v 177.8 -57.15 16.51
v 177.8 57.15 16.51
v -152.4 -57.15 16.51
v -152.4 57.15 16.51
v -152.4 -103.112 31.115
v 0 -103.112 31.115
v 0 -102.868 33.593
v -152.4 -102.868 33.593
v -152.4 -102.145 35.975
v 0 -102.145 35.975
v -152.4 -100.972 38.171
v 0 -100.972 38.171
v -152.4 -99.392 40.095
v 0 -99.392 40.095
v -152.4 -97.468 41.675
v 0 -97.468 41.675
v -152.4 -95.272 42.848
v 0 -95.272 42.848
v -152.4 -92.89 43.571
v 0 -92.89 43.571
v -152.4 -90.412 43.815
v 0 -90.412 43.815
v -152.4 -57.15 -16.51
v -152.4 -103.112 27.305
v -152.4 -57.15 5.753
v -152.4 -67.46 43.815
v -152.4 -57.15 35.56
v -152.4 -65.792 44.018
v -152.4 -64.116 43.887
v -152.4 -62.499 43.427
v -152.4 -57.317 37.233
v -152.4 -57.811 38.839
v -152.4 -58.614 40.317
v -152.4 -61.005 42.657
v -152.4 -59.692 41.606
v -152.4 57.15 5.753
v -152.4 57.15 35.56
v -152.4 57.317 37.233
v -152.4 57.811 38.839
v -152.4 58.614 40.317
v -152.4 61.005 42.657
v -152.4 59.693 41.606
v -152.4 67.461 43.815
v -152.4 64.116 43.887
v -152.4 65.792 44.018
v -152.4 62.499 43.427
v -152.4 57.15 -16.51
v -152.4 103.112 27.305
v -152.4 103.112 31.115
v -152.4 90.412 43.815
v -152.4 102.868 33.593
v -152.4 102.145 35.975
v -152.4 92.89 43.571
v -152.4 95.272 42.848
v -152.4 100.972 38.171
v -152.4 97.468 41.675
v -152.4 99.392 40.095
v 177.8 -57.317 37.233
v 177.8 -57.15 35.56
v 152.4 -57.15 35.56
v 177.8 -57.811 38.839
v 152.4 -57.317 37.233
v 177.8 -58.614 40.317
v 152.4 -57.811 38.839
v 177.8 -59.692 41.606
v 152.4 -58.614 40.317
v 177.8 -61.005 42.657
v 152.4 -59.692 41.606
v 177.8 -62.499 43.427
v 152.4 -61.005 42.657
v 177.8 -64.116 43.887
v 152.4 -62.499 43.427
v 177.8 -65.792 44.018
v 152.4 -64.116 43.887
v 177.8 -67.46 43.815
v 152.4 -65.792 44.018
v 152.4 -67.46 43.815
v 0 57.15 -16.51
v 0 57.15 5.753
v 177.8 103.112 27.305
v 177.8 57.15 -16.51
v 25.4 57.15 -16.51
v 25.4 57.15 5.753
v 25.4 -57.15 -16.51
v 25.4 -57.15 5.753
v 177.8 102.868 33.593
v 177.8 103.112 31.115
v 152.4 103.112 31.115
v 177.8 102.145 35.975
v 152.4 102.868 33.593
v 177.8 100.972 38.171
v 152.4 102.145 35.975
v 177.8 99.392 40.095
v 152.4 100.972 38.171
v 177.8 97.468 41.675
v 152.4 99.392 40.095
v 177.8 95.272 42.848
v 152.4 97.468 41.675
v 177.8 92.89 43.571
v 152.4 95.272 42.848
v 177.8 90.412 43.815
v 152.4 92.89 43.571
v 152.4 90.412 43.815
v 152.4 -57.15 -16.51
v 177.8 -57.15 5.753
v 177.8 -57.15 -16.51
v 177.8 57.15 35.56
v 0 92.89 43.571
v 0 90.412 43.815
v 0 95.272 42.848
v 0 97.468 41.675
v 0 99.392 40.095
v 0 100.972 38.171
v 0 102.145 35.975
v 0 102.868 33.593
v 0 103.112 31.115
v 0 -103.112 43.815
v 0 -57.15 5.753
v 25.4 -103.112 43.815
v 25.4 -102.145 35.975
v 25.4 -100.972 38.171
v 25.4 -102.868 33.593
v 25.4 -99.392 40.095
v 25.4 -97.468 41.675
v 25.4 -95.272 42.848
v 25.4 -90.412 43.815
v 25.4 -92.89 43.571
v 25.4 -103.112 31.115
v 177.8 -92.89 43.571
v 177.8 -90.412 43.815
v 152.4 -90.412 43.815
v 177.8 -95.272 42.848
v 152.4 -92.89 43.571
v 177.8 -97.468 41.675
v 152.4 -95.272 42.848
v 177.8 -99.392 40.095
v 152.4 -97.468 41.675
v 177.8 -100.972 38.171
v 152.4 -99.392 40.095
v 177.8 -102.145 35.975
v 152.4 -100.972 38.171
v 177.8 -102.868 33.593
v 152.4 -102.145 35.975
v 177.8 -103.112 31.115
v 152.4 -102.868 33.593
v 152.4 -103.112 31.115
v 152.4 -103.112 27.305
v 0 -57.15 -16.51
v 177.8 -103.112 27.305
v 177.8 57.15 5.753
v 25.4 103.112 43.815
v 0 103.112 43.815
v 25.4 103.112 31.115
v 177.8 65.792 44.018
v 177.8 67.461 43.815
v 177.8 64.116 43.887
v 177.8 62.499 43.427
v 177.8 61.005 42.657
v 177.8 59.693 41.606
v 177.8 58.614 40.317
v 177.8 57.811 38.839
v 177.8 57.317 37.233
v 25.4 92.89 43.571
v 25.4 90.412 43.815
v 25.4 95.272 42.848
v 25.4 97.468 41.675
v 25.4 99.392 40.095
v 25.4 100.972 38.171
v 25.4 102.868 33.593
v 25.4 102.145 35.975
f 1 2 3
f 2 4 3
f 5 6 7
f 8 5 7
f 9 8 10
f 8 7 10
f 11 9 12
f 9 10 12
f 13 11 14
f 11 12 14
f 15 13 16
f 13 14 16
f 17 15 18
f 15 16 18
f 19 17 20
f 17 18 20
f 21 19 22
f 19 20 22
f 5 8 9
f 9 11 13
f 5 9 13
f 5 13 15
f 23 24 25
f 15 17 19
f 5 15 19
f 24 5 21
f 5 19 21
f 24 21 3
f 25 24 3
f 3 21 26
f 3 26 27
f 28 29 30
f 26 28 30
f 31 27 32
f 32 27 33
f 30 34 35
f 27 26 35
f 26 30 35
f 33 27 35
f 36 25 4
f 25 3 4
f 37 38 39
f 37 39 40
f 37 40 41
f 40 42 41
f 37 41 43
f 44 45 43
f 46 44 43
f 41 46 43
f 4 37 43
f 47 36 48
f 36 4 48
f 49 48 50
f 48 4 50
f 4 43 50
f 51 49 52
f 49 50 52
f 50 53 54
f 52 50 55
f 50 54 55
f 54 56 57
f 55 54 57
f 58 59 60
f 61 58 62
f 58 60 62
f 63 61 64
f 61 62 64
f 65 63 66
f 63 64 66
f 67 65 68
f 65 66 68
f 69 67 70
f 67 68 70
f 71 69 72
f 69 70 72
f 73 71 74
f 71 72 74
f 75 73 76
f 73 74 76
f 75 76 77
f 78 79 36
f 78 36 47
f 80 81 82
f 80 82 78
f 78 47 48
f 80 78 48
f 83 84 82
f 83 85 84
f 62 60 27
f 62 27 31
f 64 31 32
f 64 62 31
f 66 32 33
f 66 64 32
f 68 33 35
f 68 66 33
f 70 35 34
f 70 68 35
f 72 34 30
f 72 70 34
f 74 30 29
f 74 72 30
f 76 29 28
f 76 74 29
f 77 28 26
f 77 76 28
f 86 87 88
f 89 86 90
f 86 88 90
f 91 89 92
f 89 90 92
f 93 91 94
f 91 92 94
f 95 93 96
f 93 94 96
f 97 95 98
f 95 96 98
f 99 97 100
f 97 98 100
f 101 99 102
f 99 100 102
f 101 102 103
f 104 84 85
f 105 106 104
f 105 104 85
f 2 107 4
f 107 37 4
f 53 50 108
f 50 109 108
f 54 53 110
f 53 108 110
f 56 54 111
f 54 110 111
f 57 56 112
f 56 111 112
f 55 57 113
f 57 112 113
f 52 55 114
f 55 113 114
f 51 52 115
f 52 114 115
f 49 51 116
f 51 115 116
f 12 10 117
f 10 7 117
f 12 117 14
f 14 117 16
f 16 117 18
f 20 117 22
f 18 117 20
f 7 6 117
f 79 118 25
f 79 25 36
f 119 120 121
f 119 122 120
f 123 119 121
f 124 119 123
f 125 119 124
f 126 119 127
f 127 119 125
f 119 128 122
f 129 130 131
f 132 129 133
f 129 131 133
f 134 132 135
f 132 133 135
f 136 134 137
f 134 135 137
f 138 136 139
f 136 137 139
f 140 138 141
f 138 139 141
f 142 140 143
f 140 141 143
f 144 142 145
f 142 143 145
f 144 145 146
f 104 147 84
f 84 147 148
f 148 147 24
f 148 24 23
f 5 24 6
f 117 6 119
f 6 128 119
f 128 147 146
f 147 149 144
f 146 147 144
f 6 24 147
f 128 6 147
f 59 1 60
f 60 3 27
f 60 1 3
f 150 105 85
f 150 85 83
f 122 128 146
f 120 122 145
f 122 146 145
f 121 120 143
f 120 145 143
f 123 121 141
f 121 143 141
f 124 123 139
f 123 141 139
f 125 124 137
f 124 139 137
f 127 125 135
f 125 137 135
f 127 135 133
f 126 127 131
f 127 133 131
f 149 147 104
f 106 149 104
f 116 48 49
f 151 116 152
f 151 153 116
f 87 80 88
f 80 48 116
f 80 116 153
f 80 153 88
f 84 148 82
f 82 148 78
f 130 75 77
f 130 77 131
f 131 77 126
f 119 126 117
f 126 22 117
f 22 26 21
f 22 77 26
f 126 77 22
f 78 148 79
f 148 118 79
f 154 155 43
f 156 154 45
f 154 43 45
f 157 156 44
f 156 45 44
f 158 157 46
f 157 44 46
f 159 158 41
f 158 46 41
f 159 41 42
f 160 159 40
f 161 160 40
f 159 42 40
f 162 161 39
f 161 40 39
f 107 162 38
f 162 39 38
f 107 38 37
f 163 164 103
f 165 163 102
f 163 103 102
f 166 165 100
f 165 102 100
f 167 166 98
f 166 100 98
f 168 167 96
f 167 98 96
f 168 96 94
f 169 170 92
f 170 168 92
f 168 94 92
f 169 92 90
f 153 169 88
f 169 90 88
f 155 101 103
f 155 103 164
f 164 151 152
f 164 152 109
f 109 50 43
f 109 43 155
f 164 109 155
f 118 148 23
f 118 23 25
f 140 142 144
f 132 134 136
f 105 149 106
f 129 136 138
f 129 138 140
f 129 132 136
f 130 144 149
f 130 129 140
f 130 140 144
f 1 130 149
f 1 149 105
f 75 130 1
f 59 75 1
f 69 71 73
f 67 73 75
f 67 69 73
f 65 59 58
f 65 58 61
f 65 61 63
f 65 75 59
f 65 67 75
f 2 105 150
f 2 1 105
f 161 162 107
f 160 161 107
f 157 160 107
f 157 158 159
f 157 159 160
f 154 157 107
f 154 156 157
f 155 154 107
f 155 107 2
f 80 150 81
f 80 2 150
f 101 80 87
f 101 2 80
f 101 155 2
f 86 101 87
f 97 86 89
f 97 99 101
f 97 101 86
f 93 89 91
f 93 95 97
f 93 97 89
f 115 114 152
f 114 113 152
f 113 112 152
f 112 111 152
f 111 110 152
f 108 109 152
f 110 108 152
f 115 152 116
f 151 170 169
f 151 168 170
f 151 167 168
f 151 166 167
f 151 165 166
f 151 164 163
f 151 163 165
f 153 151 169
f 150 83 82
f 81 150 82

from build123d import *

# Parameters (mm, degrees)
F0_W     = 114.3
F0_H     = 10.7573736592
F0_W_2   = 21.6373776872
F0_H_2   = 16.51
F0_W_3   = 22.1525625052
F1_DEPTH = 152.4
F2_R     = 12.7
F0_H_3   = 22.2626263408
F3_DEPTH = 25.4


with BuildPart() as f1:
    # F0 (on Right) → F1 (new body, symmetric)
    with BuildSketch(Plane.YZ):
        with Locations((0, 11.1313131704)):
            Rectangle(F0_W, F0_H)
        with Locations((92.2932059716, 35.56)):
            Rectangle(F0_W_2, F0_H_2)
        with Locations((-92.0356135626, 35.56)):
            Rectangle(F0_W_3, F0_H_2)
        with BuildLine():
            Line((-57.15, 5.7526263408), (-57.15, 16.51))
            Line((-57.15, 16.51), (-57.15, 35.56))
            ThreePointArc((-57.15, 35.56), (-60.3224589832, 42.164), (-67.4604916954, 43.815))
            Line((-67.4604916954, 43.815), (-80.95933231, 43.815))
            Line((-80.95933231, 43.815), (-80.95933231, 27.305))
            Line((-80.95933231, 27.305), (-57.15, 5.7526263408))
        make_face()
        with BuildLine():
            Line((57.15, 35.56), (57.15, 16.51))
            Line((57.15, 16.51), (57.15, 5.7526263408))
            Line((57.15, 5.7526263408), (81.474517128, 27.305))
            Line((81.474517128, 27.305), (81.474517128, 43.815))
            Line((81.474517128, 43.815), (67.460704078, 43.815))
            ThreePointArc((67.460704078, 43.815), (60.322539648, 42.1640828959), (57.15, 35.56))
        make_face()
        Polygon((-57.15, -16.51), (-57.15, 5.7526263408), (-80.95933231, 27.305), (-103.1118948152, 27.305), align=None)
        Polygon((81.474517128, 27.305), (57.15, 5.7526263408), (57.15, -16.51), (103.1118948152, 27.305), align=None)
    extrude(amount=F1_DEPTH, both=True)

    # F2
    f2_edges = [f1.edges().sort_by_distance(p)[0] for p in [
        (0, -103.111895, 43.815),
        (0, 103.111895, 43.815),
    ]]
    fillet(f2_edges, radius=F2_R)

    # F0 (on Right) + F1_face (on face) + F1_face1 (on face) → F3 (join)
    with BuildSketch(Plane.YZ):
        with Locations((0, 11.1313131704)):
            Rectangle(F0_W, F0_H)
        with BuildLine():
            Line((-57.15, 5.7526263408), (-57.15, 16.51))
            Line((-57.15, 16.51), (-57.15, 35.56))
            ThreePointArc((-57.15, 35.56), (-60.3224589832, 42.164), (-67.4604916954, 43.815))
            Line((-67.4604916954, 43.815), (-80.95933231, 43.815))
            Line((-80.95933231, 43.815), (-80.95933231, 27.305))
            Line((-80.95933231, 27.305), (-57.15, 5.7526263408))
        make_face()
        with BuildLine():
            Line((57.15, 35.56), (57.15, 16.51))
            Line((57.15, 16.51), (57.15, 5.7526263408))
            Line((57.15, 5.7526263408), (81.474517128, 27.305))
            Line((81.474517128, 27.305), (81.474517128, 43.815))
            Line((81.474517128, 43.815), (67.460704078, 43.815))
            ThreePointArc((67.460704078, 43.815), (60.322539648, 42.1640828959), (57.15, 35.56))
        make_face()
        with Locations((0, -5.3786868296)):
            Rectangle(F0_W, F0_H_3)
        Polygon((-57.15, -16.51), (-57.15, 5.7526263408), (-80.95933231, 27.305), (-103.1118948152, 27.305), align=None)
        Polygon((81.474517128, 27.305), (57.15, 5.7526263408), (57.15, -16.51), (103.1118948152, 27.305), align=None)
        with Locations((-92.0356135626, 35.56)):
            Rectangle(F0_W_3, F0_H_2)
        with Locations((92.2932059716, 35.56)):
            Rectangle(F0_W_2, F0_H_2)
    with BuildSketch(Plane(origin=(-152.4, 3.5899e-06, 19.1366208501), x_dir=(0, 1, 0), z_dir=(-1, 0, 0))):
        with BuildLine():
            Line((103.1118912253, -11.9783791499), (103.1118912253, -8.1683791499))
            Line((103.1118912253, -8.1683791499), (57.1499964101, 35.6466208501))
            Line((57.1499964101, 35.6466208501), (57.1499964101, 13.3839945093))
            Line((57.1499964101, 13.3839945093), (-57.1500035899, 13.3839945093))
            Line((-57.1500035899, 13.3839945093), (-57.1500035899, 35.6466208501))
            Line((-57.1500035899, 35.6466208501), (-103.111898405, -8.1683791499))
            Line((-103.111898405, -8.1683791499), (-103.111898405, -11.9783791499))
            ThreePointArc((-103.111898405, -11.9783791499), (-99.3921545261, -20.958635271), (-90.411898405, -24.6783791499))
            Line((-90.411898405, -24.6783791499), (-67.4604952852, -24.6783791499))
            ThreePointArc((-67.4604952852, -24.6783791499), (-60.3224625731, -23.0273791499), (-57.1500035899, -16.4233791499))
            Line((-57.1500035899, -16.4233791499), (-57.1500035899, 2.6266208501))
            Line((-57.1500035899, 2.6266208501), (57.1499964101, 2.6266208501))
            Line((57.1499964101, 2.6266208501), (57.1499964101, -16.4233791499))
            ThreePointArc((57.1499964101, -16.4233791499), (60.3225360581, -23.0274620458), (67.4607004881, -24.6783791499))
            Line((67.4607004881, -24.6783791499), (90.4118912253, -24.6783791499))
            ThreePointArc((90.4118912253, -24.6783791499), (99.3921473464, -20.958635271), (103.1118912253, -11.9783791499))
        make_face()
    with BuildSketch(Plane(origin=(152.4, 3.5899e-06, 19.1366208501), x_dir=(0, 1, 0), z_dir=(1, 0, 0))):
        with BuildLine():
            Line((103.1118912253, 8.1683791499), (103.1118912253, 11.9783791499))
            ThreePointArc((103.1118912253, 11.9783791499), (99.3921473464, 20.958635271), (90.4118912253, 24.6783791499))
            Line((90.4118912253, 24.6783791499), (67.4607004881, 24.6783791499))
            ThreePointArc((67.4607004881, 24.6783791499), (60.3225360581, 23.0274620458), (57.1499964101, 16.4233791499))
            Line((57.1499964101, 16.4233791499), (57.1499964101, -2.6266208501))
            Line((57.1499964101, -2.6266208501), (-57.1500035899, -2.6266208501))
            Line((-57.1500035899, -2.6266208501), (-57.1500035899, 16.4233791499))
            ThreePointArc((-57.1500035899, 16.4233791499), (-60.3224625731, 23.0273791499), (-67.4604952852, 24.6783791499))
            Line((-67.4604952852, 24.6783791499), (-90.411898405, 24.6783791499))
            ThreePointArc((-90.411898405, 24.6783791499), (-99.3921545261, 20.958635271), (-103.111898405, 11.9783791499))
            Line((-103.111898405, 11.9783791499), (-103.111898405, 8.1683791499))
            Line((-103.111898405, 8.1683791499), (-57.1500035899, -35.6466208501))
            Line((-57.1500035899, -35.6466208501), (-57.1500035899, -13.3839945093))
            Line((-57.1500035899, -13.3839945093), (57.1499964101, -13.3839945093))
            Line((57.1499964101, -13.3839945093), (57.1499964101, -35.6466208501))
            Line((57.1499964101, -35.6466208501), (103.1118912253, 8.1683791499))
        make_face()
    extrude(amount=F3_DEPTH, dir=(1, 0, 0))


solid = f1.part
